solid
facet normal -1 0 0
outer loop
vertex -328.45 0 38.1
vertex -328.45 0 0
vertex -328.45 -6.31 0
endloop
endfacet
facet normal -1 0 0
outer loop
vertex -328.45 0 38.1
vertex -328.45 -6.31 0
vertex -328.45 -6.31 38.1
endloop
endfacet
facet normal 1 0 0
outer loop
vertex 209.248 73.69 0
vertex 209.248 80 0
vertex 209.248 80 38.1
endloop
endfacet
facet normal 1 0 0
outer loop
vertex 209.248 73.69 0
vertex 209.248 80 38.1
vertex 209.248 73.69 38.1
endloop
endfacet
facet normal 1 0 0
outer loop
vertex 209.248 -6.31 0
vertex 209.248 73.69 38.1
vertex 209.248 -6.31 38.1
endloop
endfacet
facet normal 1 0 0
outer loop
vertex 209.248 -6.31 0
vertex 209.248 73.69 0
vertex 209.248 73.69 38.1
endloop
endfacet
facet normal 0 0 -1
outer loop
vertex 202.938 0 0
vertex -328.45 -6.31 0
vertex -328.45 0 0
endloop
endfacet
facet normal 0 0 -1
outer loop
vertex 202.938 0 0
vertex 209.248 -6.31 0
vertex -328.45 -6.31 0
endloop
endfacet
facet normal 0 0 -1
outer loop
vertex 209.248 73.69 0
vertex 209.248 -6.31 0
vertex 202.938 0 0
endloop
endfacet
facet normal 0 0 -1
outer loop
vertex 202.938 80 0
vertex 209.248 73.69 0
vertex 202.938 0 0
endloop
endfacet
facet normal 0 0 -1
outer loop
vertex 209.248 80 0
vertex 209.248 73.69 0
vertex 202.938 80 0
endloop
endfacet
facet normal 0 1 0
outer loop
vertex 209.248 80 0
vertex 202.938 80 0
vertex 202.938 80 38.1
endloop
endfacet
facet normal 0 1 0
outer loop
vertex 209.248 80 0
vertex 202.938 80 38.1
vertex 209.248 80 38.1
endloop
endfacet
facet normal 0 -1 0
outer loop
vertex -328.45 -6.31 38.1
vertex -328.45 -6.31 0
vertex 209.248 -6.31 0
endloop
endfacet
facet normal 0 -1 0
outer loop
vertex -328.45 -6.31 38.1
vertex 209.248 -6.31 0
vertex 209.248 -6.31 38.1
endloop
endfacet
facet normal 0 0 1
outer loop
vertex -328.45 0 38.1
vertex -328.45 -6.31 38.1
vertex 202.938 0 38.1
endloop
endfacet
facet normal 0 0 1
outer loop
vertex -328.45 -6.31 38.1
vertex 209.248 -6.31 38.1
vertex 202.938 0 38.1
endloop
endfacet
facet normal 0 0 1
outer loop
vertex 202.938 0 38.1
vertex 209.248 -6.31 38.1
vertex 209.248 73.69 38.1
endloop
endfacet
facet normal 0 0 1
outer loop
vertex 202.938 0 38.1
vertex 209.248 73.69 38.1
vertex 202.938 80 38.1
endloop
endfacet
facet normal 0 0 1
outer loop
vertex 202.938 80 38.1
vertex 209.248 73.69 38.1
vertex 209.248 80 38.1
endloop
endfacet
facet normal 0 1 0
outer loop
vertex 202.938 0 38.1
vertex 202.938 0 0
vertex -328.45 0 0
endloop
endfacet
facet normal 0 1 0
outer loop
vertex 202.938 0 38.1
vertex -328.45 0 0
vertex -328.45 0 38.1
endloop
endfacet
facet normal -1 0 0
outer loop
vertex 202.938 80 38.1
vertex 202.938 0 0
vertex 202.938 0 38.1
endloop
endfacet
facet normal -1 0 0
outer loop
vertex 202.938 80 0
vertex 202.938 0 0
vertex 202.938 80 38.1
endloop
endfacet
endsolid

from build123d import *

# Parameters (mm, degrees)
SALIENTE_EXTRUIR1_DEPTH = 38.1
CROQUIS4_W              = 140.392352489
CROQUIS4_H              = 38.1
CORTAR_EXTRUIR2_DEPTH   = 6.31
CROQUIS5_W              = 38.1
CROQUIS5_H              = 6.31
SALIENTE_EXTRUIR2_DEPTH = 328.45


with BuildPart() as part:
    # Croquis1 → Saliente-Extruir1 (new body)
    with BuildSketch(Plane.XY):
        Polygon((0, 0), (202.937647511, 0), (202.937647511, 80), (349.64, 80), (349.64, 73.69), (209.247647511, 73.69), (209.247647511, -6.31), (0, -6.31), align=None)
    extrude(amount=SALIENTE_EXTRUIR1_DEPTH)

    # Croquis4 → Cortar-Extruir2 (cut)
    with BuildSketch(Plane.XZ.offset(-73.69)):
        with Locations((279.443823756, 19.05)):
            Rectangle(CROQUIS4_W, CROQUIS4_H)
    extrude(amount=-CORTAR_EXTRUIR2_DEPTH, mode=Mode.SUBTRACT)

    # Croquis5 → Saliente-Extruir2 (add)
    with BuildSketch(Plane.ZY):
        with Locations((19.05, -3.155)):
            Rectangle(CROQUIS5_W, CROQUIS5_H)
    extrude(amount=SALIENTE_EXTRUIR2_DEPTH)


solid = part.part
